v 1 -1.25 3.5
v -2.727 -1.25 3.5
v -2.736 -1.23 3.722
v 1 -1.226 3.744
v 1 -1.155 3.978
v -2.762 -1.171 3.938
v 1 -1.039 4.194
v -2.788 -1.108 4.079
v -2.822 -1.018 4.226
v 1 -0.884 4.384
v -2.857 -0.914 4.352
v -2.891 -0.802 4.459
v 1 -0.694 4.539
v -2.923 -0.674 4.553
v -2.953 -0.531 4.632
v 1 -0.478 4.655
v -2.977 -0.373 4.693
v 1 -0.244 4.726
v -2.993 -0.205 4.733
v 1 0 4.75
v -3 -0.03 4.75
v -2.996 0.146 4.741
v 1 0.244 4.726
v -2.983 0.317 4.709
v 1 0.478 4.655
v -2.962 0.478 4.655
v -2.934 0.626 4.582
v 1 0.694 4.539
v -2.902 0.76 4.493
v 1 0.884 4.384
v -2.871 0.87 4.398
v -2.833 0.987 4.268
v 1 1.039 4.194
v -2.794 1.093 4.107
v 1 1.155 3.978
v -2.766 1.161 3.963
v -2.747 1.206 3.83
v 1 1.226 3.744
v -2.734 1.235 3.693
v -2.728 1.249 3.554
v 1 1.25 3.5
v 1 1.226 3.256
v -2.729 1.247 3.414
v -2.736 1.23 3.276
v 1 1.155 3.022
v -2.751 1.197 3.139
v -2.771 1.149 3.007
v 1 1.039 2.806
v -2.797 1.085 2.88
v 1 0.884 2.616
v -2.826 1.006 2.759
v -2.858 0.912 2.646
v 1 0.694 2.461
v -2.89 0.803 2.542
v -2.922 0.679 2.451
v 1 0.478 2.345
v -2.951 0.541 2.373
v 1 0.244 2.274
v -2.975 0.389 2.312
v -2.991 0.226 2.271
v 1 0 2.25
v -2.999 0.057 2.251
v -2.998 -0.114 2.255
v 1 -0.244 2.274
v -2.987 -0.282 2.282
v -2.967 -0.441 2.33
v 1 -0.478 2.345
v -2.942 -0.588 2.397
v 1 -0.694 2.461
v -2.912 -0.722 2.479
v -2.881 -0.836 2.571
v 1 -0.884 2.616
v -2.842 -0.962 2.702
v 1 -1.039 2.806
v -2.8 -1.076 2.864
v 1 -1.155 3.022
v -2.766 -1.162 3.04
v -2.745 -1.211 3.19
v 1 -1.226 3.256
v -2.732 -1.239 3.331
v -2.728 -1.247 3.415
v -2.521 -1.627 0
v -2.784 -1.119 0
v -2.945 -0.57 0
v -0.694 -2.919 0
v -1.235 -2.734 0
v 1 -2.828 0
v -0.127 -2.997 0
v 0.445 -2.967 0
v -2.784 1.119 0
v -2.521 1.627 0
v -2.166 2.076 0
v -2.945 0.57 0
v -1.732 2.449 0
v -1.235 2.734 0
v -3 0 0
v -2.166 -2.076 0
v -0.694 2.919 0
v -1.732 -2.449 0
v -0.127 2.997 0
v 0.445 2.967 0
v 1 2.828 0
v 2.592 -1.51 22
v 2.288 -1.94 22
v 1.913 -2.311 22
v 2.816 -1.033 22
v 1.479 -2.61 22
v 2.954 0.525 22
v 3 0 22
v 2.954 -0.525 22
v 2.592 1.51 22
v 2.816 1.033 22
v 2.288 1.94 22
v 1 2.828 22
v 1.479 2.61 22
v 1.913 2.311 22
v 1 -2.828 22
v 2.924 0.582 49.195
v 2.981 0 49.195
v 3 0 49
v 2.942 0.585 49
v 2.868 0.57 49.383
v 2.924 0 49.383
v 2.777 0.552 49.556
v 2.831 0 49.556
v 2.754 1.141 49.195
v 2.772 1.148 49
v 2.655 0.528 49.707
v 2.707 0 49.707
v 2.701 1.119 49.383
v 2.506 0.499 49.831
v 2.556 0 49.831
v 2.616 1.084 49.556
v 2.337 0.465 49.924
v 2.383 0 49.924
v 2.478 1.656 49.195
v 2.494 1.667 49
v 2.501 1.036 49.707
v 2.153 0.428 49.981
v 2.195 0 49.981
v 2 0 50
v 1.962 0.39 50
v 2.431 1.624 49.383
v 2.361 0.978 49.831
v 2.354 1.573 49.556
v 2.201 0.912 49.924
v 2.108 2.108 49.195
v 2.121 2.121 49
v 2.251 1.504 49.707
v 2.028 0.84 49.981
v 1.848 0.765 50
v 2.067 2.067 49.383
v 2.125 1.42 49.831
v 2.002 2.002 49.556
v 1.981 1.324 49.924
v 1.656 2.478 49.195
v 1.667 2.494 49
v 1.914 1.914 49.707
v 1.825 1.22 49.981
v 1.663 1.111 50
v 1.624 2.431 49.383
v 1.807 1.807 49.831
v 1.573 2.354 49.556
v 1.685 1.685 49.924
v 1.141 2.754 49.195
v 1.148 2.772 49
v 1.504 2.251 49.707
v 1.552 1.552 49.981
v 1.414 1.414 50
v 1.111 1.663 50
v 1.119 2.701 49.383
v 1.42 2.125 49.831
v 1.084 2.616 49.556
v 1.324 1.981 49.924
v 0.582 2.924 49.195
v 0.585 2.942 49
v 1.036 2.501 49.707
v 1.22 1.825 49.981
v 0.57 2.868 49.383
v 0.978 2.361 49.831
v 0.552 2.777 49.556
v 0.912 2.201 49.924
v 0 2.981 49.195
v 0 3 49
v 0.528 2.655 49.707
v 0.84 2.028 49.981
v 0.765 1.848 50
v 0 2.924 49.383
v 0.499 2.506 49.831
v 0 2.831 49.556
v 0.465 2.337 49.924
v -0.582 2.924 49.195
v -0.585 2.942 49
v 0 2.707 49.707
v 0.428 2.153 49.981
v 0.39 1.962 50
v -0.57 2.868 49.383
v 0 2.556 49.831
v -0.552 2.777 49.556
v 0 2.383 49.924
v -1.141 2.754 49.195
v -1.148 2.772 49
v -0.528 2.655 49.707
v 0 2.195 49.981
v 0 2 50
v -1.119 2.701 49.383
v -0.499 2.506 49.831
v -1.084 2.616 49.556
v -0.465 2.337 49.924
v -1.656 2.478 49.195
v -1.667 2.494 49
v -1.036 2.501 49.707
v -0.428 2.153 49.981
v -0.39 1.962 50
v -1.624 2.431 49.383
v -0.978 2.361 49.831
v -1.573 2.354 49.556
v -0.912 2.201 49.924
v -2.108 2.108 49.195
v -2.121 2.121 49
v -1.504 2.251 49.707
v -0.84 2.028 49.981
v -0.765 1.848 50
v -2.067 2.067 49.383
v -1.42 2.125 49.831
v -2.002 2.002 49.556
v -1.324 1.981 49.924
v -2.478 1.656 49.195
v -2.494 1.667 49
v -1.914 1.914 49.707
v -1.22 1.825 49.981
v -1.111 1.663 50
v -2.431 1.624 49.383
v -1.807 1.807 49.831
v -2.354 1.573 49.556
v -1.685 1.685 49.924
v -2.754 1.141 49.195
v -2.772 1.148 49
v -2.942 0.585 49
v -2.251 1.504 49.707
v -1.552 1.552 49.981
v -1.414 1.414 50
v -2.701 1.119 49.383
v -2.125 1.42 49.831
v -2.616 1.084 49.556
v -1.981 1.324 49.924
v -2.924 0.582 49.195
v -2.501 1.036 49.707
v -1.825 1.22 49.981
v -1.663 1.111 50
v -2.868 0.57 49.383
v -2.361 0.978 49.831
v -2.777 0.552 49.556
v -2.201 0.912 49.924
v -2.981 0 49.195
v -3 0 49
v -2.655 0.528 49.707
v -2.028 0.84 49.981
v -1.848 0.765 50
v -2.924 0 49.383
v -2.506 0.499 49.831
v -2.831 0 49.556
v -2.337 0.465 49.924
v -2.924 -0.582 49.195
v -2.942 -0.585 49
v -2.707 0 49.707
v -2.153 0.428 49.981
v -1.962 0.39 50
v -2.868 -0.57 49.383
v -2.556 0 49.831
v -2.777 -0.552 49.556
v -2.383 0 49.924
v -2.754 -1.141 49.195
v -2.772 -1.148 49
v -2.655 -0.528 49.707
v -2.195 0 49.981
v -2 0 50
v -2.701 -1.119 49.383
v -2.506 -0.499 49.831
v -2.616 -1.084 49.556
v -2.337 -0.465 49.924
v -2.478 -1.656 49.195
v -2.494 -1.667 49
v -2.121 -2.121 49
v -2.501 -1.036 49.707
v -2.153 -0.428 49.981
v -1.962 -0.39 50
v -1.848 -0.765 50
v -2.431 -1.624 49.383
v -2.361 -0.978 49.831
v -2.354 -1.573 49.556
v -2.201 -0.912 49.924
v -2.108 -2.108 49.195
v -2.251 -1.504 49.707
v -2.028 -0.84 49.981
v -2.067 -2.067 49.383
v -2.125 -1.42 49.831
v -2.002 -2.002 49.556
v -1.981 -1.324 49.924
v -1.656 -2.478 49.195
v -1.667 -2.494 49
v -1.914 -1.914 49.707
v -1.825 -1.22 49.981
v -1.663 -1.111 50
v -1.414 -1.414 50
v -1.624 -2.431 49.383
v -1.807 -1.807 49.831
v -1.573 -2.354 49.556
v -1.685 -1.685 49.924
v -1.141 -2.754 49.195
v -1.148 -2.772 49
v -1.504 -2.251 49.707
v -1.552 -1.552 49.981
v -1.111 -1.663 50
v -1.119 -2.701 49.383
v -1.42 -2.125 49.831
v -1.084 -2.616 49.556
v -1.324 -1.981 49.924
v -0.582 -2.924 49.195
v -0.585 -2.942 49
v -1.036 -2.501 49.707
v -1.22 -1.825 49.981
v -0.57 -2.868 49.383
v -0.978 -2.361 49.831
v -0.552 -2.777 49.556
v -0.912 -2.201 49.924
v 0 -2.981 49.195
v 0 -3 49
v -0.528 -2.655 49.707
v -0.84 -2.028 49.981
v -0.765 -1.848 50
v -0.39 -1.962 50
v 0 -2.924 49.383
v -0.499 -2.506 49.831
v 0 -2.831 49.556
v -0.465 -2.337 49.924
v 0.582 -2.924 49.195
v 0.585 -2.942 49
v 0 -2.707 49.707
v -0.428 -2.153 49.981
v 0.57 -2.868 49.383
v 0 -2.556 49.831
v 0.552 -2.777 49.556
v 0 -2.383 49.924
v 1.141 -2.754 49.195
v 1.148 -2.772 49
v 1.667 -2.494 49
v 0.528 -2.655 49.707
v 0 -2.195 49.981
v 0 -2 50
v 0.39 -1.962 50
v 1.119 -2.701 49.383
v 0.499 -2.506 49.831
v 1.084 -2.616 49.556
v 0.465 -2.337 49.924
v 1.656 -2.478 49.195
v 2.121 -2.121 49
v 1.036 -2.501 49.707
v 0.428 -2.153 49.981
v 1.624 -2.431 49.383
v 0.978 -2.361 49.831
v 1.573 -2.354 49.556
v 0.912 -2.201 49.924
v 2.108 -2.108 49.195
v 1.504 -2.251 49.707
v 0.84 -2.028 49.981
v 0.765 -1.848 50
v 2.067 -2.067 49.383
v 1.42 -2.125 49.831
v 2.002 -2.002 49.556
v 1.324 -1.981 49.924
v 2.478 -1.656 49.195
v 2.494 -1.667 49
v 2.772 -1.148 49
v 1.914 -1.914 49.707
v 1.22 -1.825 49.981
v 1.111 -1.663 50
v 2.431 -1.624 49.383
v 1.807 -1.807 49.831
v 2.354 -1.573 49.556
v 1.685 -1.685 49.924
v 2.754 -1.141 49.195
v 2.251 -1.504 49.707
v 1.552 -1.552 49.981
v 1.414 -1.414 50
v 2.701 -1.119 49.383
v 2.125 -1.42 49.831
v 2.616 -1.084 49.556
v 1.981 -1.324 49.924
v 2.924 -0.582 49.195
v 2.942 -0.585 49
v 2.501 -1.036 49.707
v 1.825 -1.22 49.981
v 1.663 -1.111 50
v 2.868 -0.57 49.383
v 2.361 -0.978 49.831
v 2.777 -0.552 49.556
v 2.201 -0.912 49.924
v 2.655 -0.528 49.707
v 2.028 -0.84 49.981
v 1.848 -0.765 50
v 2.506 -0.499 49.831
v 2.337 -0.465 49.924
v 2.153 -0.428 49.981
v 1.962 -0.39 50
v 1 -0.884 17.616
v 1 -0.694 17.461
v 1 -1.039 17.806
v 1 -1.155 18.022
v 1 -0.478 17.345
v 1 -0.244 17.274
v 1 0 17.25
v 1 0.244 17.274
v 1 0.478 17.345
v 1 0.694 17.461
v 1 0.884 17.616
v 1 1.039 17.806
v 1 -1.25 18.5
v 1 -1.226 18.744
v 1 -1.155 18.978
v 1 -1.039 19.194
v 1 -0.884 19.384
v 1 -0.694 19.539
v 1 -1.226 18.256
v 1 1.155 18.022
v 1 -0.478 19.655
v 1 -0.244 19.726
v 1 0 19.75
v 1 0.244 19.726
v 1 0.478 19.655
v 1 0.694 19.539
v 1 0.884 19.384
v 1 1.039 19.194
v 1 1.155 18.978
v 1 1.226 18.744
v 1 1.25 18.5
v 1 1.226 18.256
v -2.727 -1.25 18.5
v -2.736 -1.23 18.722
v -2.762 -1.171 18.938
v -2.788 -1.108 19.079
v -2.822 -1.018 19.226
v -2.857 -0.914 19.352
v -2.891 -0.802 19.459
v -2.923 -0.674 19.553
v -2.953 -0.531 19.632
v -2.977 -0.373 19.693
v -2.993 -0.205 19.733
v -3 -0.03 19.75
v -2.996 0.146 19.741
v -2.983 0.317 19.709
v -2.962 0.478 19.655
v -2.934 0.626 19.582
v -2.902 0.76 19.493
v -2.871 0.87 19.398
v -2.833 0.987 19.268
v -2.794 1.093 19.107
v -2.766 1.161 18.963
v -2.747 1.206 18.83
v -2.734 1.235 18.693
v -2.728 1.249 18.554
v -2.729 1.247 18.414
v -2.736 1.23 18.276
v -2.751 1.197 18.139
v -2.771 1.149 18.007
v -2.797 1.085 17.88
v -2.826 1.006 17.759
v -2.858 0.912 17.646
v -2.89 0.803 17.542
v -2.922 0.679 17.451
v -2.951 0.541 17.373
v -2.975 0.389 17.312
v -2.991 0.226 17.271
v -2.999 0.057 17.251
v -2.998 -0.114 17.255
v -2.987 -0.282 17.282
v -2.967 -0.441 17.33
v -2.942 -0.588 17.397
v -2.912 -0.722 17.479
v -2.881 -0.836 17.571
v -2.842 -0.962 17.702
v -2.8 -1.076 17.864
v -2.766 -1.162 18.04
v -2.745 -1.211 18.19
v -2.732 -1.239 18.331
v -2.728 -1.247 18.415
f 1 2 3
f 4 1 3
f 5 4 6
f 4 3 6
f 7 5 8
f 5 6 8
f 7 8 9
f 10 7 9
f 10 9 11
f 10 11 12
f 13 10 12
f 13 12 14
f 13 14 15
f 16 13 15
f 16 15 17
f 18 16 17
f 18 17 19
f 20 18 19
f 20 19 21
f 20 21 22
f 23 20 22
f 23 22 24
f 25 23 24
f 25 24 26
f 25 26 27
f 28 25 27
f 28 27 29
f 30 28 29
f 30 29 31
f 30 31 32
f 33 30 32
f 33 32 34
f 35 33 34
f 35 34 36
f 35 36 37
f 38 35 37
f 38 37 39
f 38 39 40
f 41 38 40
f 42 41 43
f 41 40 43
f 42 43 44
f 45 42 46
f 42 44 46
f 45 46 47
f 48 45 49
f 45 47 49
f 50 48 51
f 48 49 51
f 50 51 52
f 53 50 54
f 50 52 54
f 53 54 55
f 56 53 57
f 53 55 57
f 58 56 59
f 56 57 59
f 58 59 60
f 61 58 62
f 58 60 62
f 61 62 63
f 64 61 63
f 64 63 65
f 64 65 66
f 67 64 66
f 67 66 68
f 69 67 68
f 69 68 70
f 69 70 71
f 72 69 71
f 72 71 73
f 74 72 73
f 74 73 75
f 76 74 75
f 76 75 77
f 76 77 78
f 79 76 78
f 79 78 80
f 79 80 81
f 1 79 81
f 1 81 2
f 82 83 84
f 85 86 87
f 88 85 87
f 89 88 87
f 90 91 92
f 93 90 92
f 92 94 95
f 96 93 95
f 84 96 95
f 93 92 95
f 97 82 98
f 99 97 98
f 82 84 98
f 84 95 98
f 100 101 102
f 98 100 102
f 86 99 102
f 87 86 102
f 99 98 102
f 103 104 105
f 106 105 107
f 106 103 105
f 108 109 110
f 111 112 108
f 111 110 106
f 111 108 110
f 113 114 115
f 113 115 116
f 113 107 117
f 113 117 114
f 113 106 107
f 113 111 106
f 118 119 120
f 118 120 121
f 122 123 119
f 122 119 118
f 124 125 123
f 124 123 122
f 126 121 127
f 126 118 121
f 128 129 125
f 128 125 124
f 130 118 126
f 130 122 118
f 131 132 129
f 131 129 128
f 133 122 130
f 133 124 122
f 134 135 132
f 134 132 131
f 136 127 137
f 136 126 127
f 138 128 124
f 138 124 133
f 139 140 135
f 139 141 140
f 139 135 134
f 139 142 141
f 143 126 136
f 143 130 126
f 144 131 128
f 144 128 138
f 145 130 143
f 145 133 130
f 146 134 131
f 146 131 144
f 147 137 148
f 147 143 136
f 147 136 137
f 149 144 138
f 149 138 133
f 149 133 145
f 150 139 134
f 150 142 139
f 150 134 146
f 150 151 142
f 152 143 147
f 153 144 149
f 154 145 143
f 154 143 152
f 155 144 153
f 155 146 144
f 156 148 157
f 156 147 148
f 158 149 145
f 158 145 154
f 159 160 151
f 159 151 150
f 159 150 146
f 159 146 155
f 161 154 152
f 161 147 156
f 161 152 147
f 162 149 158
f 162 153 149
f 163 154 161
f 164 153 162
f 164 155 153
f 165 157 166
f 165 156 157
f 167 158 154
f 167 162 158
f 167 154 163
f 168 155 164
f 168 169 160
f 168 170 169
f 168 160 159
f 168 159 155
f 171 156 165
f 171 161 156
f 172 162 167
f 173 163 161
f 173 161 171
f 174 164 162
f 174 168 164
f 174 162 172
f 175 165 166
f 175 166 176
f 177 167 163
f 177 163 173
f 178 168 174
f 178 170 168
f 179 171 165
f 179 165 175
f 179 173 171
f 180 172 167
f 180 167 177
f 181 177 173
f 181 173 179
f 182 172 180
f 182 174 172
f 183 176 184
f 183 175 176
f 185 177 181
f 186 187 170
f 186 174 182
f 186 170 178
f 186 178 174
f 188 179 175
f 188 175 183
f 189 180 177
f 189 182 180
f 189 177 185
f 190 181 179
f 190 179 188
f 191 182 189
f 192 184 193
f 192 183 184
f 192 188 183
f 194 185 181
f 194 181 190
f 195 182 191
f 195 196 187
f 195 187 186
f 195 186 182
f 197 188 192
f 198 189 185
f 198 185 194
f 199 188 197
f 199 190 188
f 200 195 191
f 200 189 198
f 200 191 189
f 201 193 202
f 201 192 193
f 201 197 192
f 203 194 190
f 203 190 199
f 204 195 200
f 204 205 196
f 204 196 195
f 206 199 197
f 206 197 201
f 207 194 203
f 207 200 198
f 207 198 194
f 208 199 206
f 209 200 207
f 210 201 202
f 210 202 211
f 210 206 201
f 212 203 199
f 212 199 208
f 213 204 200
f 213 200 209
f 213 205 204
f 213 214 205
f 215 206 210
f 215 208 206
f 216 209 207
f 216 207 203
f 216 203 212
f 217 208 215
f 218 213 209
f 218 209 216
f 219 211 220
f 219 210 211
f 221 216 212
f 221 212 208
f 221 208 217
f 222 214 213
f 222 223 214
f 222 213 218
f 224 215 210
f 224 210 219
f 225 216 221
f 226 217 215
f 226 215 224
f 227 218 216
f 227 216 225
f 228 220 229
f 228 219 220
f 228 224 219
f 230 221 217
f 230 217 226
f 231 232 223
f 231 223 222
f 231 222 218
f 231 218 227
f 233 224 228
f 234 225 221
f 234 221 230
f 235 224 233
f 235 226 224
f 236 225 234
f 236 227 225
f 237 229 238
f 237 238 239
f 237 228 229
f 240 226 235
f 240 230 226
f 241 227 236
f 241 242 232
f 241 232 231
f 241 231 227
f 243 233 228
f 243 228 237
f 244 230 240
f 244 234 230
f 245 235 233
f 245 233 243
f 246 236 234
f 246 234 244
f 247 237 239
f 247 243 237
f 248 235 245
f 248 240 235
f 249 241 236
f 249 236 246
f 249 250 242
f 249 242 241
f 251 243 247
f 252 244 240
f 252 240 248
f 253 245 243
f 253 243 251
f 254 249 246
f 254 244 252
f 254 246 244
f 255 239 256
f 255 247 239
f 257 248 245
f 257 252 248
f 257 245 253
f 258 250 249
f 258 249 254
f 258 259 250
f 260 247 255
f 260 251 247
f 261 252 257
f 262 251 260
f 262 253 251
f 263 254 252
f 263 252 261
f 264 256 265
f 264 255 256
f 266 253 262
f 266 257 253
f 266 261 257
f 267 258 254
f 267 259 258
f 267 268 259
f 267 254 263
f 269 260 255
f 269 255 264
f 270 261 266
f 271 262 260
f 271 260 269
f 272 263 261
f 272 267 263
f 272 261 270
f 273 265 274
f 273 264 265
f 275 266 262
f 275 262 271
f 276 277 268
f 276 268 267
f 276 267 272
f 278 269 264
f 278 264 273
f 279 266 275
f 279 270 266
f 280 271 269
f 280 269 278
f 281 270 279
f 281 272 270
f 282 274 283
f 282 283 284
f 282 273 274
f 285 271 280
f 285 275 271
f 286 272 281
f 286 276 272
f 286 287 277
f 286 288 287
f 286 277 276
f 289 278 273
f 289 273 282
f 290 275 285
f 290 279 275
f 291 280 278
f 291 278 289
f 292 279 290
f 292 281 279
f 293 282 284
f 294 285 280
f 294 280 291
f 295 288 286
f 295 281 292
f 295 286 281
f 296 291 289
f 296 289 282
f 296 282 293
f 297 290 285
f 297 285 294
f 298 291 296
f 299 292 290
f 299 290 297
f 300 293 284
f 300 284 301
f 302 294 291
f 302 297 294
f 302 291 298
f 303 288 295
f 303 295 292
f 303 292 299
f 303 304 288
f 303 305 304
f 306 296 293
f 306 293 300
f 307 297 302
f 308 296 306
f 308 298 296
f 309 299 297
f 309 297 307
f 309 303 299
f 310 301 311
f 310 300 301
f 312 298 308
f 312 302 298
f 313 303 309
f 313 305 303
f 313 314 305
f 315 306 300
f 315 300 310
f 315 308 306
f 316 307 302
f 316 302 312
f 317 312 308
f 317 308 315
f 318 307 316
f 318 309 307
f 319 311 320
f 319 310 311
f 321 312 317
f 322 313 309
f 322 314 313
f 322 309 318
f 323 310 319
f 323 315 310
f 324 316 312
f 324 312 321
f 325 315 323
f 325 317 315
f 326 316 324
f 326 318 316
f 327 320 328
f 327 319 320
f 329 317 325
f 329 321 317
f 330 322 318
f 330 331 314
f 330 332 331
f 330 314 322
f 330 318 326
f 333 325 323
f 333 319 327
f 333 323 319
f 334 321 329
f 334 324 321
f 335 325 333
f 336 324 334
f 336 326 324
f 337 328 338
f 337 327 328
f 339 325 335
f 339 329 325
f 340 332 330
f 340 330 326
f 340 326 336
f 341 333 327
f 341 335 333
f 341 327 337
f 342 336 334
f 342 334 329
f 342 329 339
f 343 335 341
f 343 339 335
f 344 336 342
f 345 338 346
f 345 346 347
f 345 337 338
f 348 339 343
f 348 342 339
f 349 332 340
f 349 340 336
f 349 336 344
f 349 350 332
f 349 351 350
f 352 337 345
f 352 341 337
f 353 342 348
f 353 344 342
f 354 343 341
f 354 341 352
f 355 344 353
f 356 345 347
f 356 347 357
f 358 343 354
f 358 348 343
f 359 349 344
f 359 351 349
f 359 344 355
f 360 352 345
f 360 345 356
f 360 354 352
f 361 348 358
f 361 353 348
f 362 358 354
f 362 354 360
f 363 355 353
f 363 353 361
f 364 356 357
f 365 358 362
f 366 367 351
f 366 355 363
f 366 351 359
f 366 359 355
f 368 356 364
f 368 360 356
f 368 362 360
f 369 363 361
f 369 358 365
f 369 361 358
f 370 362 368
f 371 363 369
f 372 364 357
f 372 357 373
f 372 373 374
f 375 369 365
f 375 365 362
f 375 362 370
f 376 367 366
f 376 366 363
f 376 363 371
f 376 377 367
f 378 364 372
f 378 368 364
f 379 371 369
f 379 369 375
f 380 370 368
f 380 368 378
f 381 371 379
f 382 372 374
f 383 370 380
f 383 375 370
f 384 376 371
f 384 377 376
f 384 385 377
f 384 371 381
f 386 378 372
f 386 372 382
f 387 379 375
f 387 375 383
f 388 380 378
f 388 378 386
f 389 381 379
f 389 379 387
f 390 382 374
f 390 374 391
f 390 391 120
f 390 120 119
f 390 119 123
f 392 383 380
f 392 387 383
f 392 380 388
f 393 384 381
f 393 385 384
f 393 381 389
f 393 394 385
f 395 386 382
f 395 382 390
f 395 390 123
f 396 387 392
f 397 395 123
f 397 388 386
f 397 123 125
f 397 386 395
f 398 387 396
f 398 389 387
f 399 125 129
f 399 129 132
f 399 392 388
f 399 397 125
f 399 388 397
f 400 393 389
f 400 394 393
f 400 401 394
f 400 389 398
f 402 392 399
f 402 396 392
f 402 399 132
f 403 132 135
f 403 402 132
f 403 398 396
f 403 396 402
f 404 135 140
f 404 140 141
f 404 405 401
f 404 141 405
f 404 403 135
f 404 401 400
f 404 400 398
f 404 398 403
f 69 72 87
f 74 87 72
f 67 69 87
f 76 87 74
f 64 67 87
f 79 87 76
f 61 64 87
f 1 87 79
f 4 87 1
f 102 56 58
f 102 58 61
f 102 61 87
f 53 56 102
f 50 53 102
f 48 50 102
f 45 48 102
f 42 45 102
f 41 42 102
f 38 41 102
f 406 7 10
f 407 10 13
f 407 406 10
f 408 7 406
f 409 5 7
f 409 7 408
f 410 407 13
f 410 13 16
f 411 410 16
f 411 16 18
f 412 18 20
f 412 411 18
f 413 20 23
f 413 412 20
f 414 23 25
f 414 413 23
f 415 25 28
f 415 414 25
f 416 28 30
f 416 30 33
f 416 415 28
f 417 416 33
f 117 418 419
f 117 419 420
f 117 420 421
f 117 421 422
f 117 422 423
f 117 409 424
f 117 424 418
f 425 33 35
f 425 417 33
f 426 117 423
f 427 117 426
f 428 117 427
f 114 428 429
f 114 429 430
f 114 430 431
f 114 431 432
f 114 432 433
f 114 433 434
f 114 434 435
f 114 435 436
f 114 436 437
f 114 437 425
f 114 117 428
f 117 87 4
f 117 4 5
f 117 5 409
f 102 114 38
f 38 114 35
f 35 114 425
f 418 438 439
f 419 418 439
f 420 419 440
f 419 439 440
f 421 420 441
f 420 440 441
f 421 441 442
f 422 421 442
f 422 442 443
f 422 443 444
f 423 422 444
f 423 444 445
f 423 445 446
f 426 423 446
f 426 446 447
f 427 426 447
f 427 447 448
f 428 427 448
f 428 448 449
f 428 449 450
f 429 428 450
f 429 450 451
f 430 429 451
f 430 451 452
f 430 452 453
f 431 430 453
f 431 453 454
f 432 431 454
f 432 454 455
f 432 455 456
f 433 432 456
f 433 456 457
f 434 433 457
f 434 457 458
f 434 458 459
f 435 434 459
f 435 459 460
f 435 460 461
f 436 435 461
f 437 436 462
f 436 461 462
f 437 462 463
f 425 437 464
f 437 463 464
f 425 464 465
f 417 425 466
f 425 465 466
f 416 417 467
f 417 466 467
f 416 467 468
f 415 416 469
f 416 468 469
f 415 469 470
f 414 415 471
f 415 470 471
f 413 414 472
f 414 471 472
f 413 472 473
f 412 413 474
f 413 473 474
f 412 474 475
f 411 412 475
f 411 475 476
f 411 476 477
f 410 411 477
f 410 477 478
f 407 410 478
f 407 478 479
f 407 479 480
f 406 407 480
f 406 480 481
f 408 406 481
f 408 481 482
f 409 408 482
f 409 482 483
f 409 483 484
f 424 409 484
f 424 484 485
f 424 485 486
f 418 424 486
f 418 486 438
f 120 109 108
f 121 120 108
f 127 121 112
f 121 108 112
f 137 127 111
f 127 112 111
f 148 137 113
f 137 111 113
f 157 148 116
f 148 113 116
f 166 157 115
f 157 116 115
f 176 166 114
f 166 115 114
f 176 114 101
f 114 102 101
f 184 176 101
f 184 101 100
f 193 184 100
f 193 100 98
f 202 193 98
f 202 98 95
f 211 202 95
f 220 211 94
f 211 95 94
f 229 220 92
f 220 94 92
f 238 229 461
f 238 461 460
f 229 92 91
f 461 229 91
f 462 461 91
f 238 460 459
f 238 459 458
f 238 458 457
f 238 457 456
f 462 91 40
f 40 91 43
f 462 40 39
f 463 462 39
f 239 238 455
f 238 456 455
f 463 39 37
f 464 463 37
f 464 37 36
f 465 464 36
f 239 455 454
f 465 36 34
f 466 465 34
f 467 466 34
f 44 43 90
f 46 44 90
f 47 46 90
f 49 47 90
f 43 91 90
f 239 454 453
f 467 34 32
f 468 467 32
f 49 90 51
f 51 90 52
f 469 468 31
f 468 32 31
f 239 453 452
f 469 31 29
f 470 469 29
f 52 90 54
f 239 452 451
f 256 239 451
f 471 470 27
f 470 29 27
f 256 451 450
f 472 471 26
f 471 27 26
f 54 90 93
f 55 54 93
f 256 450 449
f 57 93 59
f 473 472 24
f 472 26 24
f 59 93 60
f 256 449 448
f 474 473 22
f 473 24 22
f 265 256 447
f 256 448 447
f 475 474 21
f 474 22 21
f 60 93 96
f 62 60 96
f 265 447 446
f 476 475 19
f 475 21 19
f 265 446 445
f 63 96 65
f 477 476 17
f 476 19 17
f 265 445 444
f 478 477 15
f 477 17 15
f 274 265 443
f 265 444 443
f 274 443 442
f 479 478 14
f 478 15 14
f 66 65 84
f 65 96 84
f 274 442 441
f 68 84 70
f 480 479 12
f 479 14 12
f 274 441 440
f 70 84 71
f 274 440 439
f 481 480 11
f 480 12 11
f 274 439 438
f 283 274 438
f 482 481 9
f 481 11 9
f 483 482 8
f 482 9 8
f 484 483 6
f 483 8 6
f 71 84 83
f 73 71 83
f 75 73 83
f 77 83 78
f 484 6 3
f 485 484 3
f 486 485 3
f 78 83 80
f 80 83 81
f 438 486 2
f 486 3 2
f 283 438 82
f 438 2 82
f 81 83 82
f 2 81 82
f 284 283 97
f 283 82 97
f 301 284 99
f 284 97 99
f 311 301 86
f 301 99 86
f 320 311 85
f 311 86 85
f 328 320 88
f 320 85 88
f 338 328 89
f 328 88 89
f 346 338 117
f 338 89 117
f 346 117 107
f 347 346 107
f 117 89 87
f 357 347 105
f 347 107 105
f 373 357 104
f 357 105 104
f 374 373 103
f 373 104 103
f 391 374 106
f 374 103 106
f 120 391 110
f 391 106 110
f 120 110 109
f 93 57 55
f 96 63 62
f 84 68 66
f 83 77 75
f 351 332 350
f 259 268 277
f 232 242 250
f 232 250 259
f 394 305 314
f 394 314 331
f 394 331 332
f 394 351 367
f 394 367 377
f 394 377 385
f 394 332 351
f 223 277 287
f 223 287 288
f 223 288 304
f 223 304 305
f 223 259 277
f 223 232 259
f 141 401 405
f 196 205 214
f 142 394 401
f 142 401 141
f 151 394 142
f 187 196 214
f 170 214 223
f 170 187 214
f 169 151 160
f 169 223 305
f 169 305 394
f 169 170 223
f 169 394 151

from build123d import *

# Parameters (mm, degrees)
F0_R     = 3
F1_DEPTH = 50
F2_R     = 1
F4_W     = 9.6827019006
F4_H     = 44
F5_DEPTH = 2
F7_D     = 2.5


with BuildPart() as f1:
    # F0 (on Top) → F1 (new body)
    with BuildSketch(Plane.XY):
        Circle(F0_R)
    extrude(amount=F1_DEPTH)

    # F2
    f2_edges = [f1.edges().sort_by_distance(p)[0] for p in [
        (-3, 0, 50),
    ]]
    fillet(f2_edges, radius=F2_R)

    # F4 (on offset) → F5 (cut)
    with BuildSketch(Plane.YZ.offset(3)):
        Rectangle(F4_W, F4_H)
    extrude(amount=-F5_DEPTH, mode=Mode.SUBTRACT)

    # F7 (through all)
    with Locations(Plane.YZ.offset(1)):
        with Locations((0, 3.5), (0, 18.5)):
            Hole(F7_D / 2)


solid = f1.part
